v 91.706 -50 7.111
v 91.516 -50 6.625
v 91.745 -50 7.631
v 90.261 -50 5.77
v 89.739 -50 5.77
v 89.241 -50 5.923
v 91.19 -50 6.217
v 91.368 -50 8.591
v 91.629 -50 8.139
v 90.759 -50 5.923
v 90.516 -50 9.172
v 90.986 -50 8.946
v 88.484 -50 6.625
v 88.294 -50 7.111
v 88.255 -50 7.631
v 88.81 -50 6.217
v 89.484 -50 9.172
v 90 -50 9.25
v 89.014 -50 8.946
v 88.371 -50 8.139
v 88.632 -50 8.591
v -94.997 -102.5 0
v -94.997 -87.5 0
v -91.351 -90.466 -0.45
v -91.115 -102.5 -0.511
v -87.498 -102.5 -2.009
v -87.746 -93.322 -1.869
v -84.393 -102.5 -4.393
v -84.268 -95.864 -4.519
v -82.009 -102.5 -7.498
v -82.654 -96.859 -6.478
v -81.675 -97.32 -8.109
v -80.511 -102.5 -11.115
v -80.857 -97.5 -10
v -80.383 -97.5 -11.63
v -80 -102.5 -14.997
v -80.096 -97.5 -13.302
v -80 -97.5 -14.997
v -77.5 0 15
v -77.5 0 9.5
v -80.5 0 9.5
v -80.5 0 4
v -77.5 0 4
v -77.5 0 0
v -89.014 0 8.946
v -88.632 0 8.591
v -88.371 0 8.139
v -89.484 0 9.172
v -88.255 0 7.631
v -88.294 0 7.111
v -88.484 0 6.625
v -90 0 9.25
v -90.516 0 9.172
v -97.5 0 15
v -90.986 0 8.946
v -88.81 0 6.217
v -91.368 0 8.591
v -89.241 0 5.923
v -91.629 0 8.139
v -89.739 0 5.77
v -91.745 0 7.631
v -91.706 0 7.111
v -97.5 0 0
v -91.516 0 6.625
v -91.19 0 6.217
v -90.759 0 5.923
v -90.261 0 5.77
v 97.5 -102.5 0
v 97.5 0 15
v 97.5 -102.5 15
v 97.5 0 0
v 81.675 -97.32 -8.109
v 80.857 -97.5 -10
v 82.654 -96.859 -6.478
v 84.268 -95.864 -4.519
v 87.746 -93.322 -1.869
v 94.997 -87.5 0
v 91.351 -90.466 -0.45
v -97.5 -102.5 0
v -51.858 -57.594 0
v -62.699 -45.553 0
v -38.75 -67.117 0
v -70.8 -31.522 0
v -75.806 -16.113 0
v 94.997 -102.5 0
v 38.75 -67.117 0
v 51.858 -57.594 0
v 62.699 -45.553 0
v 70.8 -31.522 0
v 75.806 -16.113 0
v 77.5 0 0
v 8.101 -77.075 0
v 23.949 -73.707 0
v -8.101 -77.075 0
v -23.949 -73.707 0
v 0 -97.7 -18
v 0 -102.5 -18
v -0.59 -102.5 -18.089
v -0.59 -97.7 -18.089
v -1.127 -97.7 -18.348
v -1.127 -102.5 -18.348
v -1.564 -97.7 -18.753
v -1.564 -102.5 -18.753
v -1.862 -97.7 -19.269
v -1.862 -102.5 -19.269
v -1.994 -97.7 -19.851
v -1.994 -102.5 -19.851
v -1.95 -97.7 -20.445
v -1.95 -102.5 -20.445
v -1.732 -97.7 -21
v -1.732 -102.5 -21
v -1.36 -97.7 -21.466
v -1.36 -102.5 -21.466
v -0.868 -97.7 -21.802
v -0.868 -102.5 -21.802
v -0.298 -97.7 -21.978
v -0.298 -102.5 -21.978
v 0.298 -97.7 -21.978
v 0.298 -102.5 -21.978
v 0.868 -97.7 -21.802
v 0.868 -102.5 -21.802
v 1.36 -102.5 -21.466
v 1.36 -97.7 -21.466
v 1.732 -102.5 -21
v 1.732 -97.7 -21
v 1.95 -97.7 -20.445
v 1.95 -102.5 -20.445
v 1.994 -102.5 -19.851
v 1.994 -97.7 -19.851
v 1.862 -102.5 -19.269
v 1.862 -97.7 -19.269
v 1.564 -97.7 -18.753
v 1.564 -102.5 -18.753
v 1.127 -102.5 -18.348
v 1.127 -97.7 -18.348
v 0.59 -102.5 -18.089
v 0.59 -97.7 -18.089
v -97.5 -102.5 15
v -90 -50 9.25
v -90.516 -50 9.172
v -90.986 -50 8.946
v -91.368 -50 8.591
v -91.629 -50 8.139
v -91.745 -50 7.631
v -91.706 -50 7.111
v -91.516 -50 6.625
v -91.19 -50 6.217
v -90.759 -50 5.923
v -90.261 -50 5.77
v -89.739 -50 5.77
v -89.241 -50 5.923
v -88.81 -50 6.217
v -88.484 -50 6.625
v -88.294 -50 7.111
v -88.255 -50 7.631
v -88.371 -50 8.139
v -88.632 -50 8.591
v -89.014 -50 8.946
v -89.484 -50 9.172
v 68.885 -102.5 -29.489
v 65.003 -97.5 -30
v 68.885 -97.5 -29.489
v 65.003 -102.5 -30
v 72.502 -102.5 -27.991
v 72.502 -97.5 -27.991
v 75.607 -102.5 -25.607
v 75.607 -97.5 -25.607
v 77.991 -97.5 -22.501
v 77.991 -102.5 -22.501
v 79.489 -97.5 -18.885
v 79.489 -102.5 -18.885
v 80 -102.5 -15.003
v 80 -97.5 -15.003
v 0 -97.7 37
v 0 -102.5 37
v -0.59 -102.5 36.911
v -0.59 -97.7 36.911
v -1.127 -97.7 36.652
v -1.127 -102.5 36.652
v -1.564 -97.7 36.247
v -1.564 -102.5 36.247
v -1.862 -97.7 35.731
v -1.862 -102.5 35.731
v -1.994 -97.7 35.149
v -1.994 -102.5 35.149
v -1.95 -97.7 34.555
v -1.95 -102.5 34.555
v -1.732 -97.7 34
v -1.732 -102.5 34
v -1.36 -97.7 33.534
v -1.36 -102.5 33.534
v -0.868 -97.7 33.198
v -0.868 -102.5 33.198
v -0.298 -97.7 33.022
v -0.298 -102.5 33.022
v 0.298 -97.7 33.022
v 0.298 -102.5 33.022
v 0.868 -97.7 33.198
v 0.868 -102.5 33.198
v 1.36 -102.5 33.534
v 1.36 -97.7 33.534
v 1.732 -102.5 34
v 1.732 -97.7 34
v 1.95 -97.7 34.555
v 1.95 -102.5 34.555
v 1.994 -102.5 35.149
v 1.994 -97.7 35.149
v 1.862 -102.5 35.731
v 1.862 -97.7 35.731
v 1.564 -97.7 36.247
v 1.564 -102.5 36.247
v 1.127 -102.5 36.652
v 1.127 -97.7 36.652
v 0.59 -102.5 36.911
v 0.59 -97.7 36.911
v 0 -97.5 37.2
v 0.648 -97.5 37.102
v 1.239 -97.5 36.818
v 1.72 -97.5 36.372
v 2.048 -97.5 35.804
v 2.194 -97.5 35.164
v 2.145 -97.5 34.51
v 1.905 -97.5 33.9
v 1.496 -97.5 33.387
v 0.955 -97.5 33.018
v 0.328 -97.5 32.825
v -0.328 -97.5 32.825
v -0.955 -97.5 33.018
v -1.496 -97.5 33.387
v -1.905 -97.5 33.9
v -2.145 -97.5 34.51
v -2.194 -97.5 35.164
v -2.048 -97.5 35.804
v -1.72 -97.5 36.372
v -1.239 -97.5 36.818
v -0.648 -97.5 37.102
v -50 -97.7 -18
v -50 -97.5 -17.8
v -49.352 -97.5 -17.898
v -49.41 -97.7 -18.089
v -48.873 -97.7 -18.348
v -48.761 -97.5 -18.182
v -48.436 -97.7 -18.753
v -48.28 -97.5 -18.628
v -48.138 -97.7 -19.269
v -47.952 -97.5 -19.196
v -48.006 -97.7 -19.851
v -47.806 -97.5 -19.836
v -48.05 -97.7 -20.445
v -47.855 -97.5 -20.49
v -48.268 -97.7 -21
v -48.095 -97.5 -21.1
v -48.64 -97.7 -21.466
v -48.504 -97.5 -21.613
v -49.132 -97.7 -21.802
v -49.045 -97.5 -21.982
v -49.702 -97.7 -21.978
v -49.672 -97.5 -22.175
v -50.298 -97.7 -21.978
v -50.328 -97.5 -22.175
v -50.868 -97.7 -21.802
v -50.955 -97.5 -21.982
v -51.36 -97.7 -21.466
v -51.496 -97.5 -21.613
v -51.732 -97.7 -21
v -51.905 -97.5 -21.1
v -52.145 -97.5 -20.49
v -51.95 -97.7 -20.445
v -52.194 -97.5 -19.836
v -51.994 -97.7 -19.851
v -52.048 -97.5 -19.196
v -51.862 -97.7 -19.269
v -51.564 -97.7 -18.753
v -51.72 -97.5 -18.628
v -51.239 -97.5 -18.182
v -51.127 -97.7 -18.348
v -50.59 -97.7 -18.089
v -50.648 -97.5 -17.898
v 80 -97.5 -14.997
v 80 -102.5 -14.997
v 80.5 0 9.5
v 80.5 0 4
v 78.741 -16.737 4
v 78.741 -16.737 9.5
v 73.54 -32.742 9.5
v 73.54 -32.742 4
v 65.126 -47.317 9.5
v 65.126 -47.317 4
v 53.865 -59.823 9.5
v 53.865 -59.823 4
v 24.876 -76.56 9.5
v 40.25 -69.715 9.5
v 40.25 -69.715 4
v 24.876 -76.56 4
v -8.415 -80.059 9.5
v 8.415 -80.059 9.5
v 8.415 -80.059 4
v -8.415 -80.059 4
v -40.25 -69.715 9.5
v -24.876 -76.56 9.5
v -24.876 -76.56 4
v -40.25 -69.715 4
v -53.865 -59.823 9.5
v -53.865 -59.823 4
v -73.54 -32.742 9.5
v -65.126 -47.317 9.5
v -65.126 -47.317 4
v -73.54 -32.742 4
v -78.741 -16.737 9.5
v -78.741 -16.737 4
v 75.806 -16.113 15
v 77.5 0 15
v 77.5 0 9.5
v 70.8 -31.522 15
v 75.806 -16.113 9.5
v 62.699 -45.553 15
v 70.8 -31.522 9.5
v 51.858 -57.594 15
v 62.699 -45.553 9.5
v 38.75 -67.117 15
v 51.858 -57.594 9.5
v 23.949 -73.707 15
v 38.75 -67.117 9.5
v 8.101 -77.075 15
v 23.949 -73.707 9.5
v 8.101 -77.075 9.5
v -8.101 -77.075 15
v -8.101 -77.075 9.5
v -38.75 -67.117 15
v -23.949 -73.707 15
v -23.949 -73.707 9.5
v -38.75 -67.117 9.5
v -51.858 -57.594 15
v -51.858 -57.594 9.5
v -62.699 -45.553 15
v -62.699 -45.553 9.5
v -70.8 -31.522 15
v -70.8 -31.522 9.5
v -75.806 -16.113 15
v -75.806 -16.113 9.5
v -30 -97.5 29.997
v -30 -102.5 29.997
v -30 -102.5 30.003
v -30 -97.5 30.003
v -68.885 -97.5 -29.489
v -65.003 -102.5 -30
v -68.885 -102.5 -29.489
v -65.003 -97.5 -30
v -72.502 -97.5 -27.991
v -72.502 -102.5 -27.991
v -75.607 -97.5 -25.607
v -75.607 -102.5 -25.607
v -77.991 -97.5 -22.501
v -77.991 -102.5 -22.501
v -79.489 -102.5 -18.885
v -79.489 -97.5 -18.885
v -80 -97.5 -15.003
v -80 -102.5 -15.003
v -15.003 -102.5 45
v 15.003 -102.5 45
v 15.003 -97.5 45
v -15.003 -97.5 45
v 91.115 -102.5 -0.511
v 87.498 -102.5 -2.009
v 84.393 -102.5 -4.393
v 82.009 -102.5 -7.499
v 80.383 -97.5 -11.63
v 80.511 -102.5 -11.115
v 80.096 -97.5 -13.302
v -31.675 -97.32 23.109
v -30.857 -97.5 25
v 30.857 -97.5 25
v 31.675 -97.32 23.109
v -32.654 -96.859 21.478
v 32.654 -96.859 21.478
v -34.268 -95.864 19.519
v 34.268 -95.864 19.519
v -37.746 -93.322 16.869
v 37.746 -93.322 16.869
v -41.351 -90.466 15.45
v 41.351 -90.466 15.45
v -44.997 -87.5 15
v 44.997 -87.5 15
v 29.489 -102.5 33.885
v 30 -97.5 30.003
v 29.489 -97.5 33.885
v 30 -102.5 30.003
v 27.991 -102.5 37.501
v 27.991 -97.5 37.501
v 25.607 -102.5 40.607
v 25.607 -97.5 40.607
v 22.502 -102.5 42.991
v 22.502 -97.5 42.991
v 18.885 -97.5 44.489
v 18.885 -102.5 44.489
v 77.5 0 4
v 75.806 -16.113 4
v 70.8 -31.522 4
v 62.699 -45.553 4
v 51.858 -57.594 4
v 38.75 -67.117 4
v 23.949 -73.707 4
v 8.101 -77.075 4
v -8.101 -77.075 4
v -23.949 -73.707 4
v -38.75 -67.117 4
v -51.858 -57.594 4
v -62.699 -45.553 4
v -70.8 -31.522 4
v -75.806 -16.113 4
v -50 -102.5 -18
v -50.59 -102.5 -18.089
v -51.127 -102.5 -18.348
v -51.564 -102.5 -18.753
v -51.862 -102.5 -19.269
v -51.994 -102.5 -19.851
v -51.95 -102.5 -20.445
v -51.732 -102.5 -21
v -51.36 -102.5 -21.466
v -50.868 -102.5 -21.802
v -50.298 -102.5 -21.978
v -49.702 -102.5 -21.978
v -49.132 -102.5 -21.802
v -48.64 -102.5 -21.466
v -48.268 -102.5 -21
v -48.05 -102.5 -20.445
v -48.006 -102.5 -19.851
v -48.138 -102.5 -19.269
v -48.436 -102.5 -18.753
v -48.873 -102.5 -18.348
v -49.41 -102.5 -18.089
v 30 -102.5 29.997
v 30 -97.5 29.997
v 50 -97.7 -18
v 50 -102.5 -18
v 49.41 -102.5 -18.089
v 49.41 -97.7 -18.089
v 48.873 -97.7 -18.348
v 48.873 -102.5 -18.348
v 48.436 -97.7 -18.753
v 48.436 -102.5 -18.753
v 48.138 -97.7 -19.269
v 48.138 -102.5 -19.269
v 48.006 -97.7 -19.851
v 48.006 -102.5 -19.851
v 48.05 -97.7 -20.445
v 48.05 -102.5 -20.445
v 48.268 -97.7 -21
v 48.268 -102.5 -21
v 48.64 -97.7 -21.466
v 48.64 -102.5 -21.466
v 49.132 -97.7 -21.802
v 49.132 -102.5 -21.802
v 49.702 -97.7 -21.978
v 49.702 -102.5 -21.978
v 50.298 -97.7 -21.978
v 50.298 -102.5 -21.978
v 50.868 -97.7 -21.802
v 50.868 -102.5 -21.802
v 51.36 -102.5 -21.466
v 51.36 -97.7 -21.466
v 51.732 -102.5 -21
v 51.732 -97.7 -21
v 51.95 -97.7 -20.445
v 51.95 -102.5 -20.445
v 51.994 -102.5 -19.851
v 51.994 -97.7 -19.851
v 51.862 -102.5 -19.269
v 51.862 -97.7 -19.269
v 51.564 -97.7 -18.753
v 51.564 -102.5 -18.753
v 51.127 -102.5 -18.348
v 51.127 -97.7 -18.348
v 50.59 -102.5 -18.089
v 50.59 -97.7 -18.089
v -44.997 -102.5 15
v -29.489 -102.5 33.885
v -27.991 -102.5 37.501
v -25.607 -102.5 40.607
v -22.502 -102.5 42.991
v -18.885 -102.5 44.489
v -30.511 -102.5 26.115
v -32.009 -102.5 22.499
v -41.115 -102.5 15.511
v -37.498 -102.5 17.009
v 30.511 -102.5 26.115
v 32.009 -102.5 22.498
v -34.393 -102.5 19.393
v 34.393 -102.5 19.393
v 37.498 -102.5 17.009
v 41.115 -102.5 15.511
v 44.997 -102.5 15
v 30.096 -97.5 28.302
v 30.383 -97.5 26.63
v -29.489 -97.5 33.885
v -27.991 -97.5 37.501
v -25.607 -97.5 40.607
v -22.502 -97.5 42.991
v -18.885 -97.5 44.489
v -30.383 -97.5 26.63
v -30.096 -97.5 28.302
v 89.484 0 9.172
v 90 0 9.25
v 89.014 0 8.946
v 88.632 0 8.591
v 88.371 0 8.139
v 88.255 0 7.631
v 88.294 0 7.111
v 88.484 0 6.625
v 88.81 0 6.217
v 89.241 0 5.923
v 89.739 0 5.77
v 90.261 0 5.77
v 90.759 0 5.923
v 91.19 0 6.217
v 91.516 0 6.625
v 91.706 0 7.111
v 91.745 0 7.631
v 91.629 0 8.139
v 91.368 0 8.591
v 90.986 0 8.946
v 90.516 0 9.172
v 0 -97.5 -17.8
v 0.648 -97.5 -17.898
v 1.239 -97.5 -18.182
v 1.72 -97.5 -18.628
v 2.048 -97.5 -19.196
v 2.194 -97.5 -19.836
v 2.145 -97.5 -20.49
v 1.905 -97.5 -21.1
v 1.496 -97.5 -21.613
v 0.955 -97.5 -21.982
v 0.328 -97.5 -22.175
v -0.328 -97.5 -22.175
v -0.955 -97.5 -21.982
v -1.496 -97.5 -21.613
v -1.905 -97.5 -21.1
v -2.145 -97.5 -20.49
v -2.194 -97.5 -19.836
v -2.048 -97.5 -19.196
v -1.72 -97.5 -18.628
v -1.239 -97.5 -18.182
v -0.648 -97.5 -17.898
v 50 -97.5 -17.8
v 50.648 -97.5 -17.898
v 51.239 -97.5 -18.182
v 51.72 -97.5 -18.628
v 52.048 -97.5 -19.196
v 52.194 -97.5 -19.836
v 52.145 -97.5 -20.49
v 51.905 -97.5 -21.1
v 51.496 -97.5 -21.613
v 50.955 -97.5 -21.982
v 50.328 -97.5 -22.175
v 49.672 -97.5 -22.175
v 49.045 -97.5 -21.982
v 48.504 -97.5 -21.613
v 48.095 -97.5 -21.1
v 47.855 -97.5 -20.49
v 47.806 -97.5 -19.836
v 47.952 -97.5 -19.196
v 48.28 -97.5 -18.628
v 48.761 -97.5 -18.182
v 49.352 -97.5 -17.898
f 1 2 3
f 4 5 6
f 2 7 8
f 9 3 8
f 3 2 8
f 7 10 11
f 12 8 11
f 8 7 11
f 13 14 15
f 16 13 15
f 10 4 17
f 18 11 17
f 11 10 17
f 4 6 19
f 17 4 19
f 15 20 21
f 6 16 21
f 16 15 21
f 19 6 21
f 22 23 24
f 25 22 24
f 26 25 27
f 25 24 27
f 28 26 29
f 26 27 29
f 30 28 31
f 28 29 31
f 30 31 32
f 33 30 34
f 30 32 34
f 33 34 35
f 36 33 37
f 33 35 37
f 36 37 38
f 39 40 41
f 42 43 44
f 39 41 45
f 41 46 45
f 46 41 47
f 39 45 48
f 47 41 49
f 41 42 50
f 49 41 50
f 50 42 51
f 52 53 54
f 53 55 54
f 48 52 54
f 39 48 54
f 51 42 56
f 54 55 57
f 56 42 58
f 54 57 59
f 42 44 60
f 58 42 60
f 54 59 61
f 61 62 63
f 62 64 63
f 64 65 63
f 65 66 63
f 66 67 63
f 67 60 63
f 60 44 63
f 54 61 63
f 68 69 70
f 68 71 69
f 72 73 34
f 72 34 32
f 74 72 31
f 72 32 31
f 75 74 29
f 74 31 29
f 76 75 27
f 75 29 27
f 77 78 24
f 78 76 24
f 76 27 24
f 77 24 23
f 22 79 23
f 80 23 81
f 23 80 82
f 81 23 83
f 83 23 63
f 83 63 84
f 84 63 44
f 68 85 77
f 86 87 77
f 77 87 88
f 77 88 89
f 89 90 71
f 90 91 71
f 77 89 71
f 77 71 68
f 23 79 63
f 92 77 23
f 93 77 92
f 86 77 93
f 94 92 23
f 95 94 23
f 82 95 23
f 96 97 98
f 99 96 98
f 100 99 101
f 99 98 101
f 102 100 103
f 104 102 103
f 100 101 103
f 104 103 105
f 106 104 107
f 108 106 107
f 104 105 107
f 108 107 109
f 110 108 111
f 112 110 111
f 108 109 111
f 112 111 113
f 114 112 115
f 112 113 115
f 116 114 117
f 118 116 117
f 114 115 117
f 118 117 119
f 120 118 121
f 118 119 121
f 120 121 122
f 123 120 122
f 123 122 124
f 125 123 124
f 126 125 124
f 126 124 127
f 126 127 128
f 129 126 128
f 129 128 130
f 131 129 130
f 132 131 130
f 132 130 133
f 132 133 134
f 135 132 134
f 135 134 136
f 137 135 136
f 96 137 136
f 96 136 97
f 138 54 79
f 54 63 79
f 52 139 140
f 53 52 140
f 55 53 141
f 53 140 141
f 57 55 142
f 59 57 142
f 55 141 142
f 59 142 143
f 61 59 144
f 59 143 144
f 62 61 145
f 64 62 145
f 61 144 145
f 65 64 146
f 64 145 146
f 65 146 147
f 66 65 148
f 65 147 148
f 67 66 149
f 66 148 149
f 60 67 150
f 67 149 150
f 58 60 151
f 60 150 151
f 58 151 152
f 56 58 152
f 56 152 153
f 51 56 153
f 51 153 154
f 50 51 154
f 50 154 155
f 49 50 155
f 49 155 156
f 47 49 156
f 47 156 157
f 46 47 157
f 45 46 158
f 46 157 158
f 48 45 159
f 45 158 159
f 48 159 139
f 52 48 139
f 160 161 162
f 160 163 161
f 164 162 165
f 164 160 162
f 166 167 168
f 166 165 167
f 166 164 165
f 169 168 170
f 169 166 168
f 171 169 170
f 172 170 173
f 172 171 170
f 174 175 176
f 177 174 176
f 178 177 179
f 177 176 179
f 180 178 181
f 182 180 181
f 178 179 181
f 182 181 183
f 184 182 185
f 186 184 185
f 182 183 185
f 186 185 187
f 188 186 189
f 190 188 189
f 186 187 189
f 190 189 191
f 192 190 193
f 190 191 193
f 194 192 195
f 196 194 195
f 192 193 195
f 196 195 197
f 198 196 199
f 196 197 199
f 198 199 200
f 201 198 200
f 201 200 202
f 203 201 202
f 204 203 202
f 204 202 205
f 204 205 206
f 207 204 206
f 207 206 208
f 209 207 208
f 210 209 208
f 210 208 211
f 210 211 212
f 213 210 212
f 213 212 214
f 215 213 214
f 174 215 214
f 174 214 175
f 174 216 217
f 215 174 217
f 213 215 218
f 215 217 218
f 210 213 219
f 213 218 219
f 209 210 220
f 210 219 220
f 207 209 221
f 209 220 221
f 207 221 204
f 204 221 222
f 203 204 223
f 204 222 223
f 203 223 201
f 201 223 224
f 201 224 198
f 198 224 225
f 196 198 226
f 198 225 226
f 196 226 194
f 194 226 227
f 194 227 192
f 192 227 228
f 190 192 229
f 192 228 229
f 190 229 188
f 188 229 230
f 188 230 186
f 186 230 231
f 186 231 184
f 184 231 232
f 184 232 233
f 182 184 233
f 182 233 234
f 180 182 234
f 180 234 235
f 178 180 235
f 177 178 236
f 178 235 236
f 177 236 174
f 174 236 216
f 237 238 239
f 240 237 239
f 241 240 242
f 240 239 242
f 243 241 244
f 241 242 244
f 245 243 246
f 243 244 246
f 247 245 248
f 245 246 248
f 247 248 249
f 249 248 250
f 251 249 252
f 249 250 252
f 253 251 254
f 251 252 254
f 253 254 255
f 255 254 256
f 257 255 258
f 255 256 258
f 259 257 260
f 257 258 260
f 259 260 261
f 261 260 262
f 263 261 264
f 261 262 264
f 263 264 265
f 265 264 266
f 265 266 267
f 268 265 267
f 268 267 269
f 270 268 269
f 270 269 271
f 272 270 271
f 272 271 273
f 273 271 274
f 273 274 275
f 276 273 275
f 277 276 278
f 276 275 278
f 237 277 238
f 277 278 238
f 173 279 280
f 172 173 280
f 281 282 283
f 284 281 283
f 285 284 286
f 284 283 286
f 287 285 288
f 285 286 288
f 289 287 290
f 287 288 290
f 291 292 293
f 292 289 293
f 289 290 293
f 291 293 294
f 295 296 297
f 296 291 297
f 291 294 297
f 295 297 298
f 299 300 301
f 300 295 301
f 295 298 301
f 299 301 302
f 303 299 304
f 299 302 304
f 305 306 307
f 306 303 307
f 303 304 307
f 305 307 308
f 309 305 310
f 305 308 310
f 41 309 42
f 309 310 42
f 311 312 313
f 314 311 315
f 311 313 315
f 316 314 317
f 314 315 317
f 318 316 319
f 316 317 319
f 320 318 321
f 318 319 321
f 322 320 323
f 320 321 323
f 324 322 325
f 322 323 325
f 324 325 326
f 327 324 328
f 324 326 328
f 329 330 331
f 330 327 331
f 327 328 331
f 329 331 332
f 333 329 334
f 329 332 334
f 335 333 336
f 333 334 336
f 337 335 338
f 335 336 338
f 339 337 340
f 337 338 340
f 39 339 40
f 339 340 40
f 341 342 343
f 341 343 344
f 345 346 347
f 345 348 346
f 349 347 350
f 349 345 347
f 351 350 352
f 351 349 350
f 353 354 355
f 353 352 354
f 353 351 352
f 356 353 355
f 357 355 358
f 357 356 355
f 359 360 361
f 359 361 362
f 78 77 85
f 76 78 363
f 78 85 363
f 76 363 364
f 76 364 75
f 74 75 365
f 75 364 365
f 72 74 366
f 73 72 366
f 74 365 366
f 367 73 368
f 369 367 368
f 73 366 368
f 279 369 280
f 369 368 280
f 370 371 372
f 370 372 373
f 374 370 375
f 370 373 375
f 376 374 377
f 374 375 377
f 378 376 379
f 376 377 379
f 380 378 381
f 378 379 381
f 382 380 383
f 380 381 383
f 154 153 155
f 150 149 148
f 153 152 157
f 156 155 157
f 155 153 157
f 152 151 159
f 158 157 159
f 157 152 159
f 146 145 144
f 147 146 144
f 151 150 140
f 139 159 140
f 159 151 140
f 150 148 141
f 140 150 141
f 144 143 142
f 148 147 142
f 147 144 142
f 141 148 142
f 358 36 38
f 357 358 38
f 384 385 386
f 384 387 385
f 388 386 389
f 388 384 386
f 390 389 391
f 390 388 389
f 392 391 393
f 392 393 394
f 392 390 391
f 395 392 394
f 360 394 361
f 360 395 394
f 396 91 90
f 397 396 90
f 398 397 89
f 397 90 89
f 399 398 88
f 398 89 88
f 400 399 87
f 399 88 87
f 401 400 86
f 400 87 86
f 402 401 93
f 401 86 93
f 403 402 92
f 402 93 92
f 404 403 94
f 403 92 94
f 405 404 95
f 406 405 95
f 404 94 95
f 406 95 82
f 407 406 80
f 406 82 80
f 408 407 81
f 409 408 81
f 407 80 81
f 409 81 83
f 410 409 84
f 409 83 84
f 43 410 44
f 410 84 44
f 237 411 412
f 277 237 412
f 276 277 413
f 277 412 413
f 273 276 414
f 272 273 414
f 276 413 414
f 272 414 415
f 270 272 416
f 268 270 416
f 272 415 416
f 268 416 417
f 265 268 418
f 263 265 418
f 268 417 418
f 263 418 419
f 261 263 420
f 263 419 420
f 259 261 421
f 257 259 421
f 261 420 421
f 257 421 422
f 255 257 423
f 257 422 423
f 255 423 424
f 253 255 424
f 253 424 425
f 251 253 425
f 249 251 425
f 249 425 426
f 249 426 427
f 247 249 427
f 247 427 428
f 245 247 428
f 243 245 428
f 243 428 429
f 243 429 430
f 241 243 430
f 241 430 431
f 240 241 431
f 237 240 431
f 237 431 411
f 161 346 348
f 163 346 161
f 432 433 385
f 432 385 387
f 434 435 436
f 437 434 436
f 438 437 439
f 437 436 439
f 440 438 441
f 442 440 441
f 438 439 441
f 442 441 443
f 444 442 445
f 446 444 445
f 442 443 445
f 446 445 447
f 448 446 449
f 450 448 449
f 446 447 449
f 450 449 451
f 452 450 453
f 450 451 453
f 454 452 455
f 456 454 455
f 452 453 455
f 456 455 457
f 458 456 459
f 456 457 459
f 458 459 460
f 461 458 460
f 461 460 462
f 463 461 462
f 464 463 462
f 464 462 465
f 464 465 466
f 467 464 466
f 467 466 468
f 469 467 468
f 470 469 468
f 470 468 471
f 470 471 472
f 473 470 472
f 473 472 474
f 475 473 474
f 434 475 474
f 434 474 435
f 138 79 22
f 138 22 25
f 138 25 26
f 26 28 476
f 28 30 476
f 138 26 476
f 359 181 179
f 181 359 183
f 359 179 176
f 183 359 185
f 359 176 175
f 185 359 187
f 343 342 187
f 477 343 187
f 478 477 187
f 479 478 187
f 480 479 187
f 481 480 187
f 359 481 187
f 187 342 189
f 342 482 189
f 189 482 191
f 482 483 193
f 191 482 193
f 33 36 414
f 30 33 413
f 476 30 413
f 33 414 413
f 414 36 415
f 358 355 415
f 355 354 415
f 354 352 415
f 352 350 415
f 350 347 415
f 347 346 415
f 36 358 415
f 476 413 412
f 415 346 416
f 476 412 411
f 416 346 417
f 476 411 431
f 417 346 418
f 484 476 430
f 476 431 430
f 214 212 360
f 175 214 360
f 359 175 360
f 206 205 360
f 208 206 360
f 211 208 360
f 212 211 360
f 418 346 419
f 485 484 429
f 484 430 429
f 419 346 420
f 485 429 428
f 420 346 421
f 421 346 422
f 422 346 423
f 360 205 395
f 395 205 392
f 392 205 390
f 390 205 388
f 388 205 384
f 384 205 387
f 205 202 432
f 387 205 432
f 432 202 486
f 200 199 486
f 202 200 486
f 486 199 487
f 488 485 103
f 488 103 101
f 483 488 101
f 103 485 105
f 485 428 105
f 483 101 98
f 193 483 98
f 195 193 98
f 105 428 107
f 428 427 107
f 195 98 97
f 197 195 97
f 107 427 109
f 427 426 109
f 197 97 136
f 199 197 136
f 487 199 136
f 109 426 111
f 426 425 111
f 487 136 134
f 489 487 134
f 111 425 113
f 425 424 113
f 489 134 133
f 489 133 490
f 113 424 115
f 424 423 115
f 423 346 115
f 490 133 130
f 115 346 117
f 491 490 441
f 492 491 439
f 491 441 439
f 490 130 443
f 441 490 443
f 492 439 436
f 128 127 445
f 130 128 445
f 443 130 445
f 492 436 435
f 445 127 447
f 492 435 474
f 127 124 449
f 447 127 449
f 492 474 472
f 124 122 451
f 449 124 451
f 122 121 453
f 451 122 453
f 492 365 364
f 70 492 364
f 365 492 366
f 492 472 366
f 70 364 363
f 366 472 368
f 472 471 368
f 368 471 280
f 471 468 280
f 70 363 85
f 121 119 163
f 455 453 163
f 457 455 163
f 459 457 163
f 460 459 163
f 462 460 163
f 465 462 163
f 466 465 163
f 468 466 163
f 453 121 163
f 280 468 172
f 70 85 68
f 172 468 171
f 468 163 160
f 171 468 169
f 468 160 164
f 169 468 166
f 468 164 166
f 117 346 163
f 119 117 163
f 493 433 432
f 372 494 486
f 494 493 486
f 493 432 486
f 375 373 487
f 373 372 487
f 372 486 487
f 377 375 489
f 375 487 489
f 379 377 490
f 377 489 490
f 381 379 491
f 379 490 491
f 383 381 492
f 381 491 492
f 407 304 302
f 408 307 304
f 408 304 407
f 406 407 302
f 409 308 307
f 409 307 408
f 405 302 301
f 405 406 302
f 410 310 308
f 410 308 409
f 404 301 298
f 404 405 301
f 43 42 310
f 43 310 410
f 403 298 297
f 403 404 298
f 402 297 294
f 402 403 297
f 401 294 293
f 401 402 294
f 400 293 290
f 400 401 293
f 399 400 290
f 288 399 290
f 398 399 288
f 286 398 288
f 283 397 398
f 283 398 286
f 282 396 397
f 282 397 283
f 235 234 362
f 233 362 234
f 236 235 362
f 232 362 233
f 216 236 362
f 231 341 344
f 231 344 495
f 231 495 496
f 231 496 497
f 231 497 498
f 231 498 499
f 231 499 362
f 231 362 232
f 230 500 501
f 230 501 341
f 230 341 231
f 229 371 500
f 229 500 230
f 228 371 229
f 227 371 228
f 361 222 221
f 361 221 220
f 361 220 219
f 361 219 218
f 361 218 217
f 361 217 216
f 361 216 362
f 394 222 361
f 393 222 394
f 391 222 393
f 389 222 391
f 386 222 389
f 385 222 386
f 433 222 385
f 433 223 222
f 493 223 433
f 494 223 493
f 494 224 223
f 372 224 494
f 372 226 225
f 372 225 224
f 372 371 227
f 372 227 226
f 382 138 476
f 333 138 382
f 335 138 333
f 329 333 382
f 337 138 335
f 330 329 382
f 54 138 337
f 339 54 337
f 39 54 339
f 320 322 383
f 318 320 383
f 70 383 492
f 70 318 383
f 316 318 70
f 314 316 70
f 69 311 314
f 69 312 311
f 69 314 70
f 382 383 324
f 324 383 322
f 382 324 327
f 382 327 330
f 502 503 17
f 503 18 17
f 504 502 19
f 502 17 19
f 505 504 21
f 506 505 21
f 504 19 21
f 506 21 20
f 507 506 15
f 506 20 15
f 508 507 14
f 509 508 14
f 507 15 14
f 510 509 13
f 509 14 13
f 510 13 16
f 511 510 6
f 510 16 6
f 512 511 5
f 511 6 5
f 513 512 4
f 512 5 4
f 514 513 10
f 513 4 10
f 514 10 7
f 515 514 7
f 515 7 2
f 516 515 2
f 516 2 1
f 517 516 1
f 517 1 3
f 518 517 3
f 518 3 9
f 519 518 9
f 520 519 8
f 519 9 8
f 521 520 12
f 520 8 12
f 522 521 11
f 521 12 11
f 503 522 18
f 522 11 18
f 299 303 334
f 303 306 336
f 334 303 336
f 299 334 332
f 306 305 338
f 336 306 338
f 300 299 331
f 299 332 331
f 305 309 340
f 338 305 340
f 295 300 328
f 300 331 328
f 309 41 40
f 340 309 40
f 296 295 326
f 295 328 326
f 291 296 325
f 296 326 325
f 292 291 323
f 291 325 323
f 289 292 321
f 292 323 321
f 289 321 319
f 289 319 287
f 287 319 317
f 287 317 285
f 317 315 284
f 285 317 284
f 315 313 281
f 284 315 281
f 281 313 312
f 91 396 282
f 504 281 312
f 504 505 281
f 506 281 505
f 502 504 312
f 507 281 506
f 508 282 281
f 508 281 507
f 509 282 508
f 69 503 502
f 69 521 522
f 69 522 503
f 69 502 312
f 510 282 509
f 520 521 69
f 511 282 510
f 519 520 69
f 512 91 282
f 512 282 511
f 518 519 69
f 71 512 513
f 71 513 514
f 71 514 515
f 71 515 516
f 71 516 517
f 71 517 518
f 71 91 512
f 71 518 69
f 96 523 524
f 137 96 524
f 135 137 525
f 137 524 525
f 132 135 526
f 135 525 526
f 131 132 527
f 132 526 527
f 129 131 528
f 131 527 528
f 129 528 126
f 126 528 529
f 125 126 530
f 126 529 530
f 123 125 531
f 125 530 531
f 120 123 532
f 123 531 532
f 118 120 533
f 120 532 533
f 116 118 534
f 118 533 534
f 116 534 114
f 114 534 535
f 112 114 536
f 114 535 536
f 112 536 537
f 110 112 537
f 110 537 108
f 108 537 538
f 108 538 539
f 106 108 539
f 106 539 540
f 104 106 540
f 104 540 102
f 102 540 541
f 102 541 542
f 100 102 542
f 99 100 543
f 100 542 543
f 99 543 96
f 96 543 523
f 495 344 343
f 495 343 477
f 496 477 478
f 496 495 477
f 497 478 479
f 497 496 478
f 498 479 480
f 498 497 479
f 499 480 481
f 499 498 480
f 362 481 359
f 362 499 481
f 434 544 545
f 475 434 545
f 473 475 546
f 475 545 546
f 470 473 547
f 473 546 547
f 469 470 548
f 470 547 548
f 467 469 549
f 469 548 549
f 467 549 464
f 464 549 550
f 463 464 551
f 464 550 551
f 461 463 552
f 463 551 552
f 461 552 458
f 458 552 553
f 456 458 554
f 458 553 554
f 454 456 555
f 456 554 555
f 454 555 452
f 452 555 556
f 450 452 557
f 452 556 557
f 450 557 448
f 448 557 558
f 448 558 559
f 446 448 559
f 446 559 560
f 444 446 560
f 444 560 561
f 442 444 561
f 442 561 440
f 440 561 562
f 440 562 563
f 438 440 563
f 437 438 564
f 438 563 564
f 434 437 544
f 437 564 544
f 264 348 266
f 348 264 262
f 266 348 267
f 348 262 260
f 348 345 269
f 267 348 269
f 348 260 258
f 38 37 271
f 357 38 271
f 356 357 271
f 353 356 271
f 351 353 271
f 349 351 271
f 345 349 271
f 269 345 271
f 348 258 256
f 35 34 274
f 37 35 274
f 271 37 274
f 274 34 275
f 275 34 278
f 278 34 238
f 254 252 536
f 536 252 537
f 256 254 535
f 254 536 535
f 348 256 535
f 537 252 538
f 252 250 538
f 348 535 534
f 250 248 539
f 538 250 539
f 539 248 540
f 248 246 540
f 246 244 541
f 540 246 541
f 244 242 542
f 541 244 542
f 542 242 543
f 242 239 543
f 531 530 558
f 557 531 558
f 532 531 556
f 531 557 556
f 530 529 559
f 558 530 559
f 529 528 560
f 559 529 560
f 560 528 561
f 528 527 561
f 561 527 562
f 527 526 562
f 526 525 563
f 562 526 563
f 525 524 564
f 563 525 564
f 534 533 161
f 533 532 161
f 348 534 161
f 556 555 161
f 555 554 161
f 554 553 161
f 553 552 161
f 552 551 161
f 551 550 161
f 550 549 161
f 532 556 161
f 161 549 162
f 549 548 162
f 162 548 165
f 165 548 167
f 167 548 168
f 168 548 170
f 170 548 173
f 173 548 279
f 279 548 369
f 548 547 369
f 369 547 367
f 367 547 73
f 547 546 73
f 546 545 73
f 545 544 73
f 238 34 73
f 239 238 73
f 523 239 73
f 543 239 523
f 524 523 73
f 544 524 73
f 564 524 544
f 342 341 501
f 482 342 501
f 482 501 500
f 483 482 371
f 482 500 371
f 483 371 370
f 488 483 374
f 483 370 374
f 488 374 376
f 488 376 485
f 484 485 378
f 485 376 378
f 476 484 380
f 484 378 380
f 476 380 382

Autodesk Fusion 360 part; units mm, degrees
sketch "Sketch1" plane through (0, 0, 0) normal (0, 0, 1) x (1, 0, 0)
  circle A0 centre (0, 0) radius 87.5
  circle A1 centre (0, 0) radius 77.5
  line L0 (77.5, 0) -> (97.5, 0)
  line L1 (97.5, 0) -> (97.5, -97.5)
  line L2 (97.5, -97.5) -> (77.5, -97.5)
  line L3 (77.5, -97.5) -> (77.5, 0)
  line L4 (-77.5, 0) -> (-97.5, 0)
  line L5 (-97.5, 0) -> (-97.5, -97.5)
  line L6 (-97.5, -97.5) -> (-77.5, -97.5)
  line L7 (-77.5, -97.5) -> (-77.5, 0)
  line L8 (97.5, -97.5) -> (-97.5, -97.5)
  line L9 (-97.5, -97.5) -> (-97.5, -102.5)
  line L10 (-97.5, -102.5) -> (97.5, -102.5)
  line L11 (97.5, -102.5) -> (97.5, -97.5)
  dimension "d1" = 155
  dimension "d2" = 175
  dimension "d15" = 97.5
  dimension "d16" = 5
  dimension "d17" = 10
  dimension "d18" = 20
  dimension "d19" = 20
extrude "Extrude1" add sketch "Sketch1" along normal blind 15 contours A0 L0 L1 L2 L3 L8 | A0 L0 L3 | A0 L4 L7 | A0 L4 L5 L6 L7 L8 | A0 L3 L7 L8 | A0 A1 L3 L7 | L2 L6 L8 L9 L10 L11
sketch "Sketch2" plane through (0, 0, 0) normal (0, 0, 1) x (1, 0, 0)
  circle A0 centre (0, 0) radius 80.5
  dimension "d10" = 161
extrude "Extrude2" cut sketch "Sketch2" along normal blind 5.5 from surface at 4
sketch "Sketch3" plane through (0, 0, 15) normal (0, 0, 1) x (-1, 0, 0)
  line L0 (77.5, 0) -> (97.5, 0)
  line L1 (97.5, 0) -> (97.5, 102.5)
  line L2 (97.5, 102.5) -> (-97.5, 102.5)
  line L3 (-97.5, 102.5) -> (-97.5, 0)
  line L4 (-97.5, 0) -> (-77.5, 0)
  arc A0 (77.5, 0) -> (-77.5, 0) centre (0, 0) ccw
  line L5 (-30, 102.5) -> (30, 102.5)
  line L6 (30, 102.5) -> (30, 97.5)
  line L7 (30, 97.5) -> (-30, 97.5)
  line L8 (-30, 97.5) -> (-30, 102.5)
  dimension "d22" = 30
  dimension "d23" = 30
extrude "Extrude3" add sketch "Sketch3" along normal blind 30 contours L2 L5 L6 L7 L8
fillet "Fillet2" radius 15 4 edges at (-30, -100, 45) (30, -100, 45) (-30, -100, 15) (30, -100, 15)
sketch "Sketch4" plane through (0, -97.5, 0) normal (0, 1, 0) x (-1, 0, 0)
  arc A0 (-15, 45) -> (-30, 30) centre (-15, 30) ccw
  arc A1 (-45, 15) -> (-30, 30) centre (-45, 30) ccw
  line L0 (-45, 15) -> (45, 15)
  arc A2 (30, 30) -> (45, 15) centre (45, 30) ccw
  arc A3 (30, 30) -> (15, 45) centre (15, 30) ccw
  line L1 (15, 45) -> (-15, 45)
  line L2 (-97.5, 7.5) -> (97.5, 7.5) construction
  line L3 (-45, 0) -> (45, 0)
  line L4 (15, -30) -> (-15, -30)
  arc A4 (15, -30) -> (30, -15) centre (15, -15) ccw
  arc A5 (45, 0) -> (30, -15) centre (45, -15) ccw
  arc A6 (-30, -15) -> (-15, -30) centre (-15, -15) ccw
  arc A7 (-30, -15) -> (-45, 0) centre (-45, -15) ccw
  point P0 (0, 30)
  point P1 (-97.5, 7.5)
  point P2 (97.5, 7.5)
  point P3 (0, -15)
  dimension "d28" = 15
sketch "Sketch5" plane through (0, 0, 0) normal (0, 0, -1) x (1, 0, 0)
  line L0 (-97.5, 0) -> (-77.5, 0)
  arc A0 (77.5, 0) -> (-77.5, 0) centre (0, 0) ccw
  line L1 (77.5, 0) -> (97.5, 0)
  line L2 (97.5, 0) -> (97.5, 102.5)
  line L3 (97.5, 102.5) -> (-97.5, 102.5)
  line L4 (-97.5, 102.5) -> (-97.5, 0)
  line L5 (80, 102.5) -> (-80, 102.5)
  line L6 (-80, 102.5) -> (-80, 97.5)
  line L7 (-80, 97.5) -> (80, 97.5)
  line L8 (80, 97.5) -> (80, 102.5)
  dimension "d39" = 80
  dimension "d40" = 80
extrude "Extrude4" add sketch "Sketch5" along normal blind 30 contours L3 L5 L6 L7 L8
fillet "Fillet4" radius 15 4 edges at (80, -100, -30) (-80, -100, -30) (-80, -100, 0) (80, -100, 0)
sketch "Sketch6" plane through (0, -97.5, 0) normal (0, 1, 0) x (-1, 0, 0)
  arc A0 (65, -30) -> (80, -15) centre (65, -15) ccw
  arc A1 (95, 0) -> (80, -15) centre (95, -15) ccw
  line L0 (95, 0) -> (-95, 0)
  arc A2 (-80, -15) -> (-95, 0) centre (-95, -15) ccw
  arc A3 (-80, -15) -> (-65, -30) centre (-65, -15) ccw
  line L1 (-65, -30) -> (65, -30)
  line L2 (-77.5, 15) -> (77.5, 15)
  point P0 (0, -20)
  point P1 (0, 35)
  point P2 (50, -20)
  point P3 (-50, -20)
  dimension "d49" = 20
  dimension "d50" = 20
  dimension "d53" = 50
  dimension "d54" = 50
hole "Hole2" at (0, -97.5, -20) at (0, -97.5, 35) at (-50, -97.5, -20) at (50, -97.5, -20) direction (0, -1, 0) diameter 4 end through all countersink diameter 4.4 countersink angle 90
sketch "Sketch7" plane through (0, 0, 0) normal (0, 1, 0) x (-1, 0, 0)
  line L0 (77.5, 9.5) -> (80.5, 9.5)
  line L1 (80.5, 9.5) -> (80.5, 4)
  line L2 (80.5, 4) -> (77.5, 4)
  line L3 (77.5, 4) -> (77.5, 0)
  line L4 (77.5, 0) -> (97.5, 0)
  line L5 (97.5, 0) -> (97.5, 15)
  line L6 (97.5, 15) -> (77.5, 15)
  line L7 (77.5, 15) -> (77.5, 9.5)
  line L8 (-77.5, 0) -> (-97.5, 0)
  line L9 (-97.5, 0) -> (-97.5, 15)
  point P0 (90, 7.5)
  point P1 (-90, 7.5)
  dimension "d55" = 7.5
  dimension "d56" = 7.5
  dimension "d57" = 7.5
  dimension "d58" = 7.5
hole "Hole3" at (-90, 0, 7.5) at (90, 0, 7.5) direction (0, -1, 0) diameter 3.5 depth 50 tip angle 180
fillet "Fillet5" radius 10 2 edges at (0, -97.5, 0) (0, -97.5, 15)
equation "d15 = d2 / 2 + 10 mm"
equation "d18 = d17 + 10 mm"
equation "d19 = d18"
equation "d23 = d22"
equation "d40 = d39"
equation "d56 = d55"
equation "d58 = d57"
